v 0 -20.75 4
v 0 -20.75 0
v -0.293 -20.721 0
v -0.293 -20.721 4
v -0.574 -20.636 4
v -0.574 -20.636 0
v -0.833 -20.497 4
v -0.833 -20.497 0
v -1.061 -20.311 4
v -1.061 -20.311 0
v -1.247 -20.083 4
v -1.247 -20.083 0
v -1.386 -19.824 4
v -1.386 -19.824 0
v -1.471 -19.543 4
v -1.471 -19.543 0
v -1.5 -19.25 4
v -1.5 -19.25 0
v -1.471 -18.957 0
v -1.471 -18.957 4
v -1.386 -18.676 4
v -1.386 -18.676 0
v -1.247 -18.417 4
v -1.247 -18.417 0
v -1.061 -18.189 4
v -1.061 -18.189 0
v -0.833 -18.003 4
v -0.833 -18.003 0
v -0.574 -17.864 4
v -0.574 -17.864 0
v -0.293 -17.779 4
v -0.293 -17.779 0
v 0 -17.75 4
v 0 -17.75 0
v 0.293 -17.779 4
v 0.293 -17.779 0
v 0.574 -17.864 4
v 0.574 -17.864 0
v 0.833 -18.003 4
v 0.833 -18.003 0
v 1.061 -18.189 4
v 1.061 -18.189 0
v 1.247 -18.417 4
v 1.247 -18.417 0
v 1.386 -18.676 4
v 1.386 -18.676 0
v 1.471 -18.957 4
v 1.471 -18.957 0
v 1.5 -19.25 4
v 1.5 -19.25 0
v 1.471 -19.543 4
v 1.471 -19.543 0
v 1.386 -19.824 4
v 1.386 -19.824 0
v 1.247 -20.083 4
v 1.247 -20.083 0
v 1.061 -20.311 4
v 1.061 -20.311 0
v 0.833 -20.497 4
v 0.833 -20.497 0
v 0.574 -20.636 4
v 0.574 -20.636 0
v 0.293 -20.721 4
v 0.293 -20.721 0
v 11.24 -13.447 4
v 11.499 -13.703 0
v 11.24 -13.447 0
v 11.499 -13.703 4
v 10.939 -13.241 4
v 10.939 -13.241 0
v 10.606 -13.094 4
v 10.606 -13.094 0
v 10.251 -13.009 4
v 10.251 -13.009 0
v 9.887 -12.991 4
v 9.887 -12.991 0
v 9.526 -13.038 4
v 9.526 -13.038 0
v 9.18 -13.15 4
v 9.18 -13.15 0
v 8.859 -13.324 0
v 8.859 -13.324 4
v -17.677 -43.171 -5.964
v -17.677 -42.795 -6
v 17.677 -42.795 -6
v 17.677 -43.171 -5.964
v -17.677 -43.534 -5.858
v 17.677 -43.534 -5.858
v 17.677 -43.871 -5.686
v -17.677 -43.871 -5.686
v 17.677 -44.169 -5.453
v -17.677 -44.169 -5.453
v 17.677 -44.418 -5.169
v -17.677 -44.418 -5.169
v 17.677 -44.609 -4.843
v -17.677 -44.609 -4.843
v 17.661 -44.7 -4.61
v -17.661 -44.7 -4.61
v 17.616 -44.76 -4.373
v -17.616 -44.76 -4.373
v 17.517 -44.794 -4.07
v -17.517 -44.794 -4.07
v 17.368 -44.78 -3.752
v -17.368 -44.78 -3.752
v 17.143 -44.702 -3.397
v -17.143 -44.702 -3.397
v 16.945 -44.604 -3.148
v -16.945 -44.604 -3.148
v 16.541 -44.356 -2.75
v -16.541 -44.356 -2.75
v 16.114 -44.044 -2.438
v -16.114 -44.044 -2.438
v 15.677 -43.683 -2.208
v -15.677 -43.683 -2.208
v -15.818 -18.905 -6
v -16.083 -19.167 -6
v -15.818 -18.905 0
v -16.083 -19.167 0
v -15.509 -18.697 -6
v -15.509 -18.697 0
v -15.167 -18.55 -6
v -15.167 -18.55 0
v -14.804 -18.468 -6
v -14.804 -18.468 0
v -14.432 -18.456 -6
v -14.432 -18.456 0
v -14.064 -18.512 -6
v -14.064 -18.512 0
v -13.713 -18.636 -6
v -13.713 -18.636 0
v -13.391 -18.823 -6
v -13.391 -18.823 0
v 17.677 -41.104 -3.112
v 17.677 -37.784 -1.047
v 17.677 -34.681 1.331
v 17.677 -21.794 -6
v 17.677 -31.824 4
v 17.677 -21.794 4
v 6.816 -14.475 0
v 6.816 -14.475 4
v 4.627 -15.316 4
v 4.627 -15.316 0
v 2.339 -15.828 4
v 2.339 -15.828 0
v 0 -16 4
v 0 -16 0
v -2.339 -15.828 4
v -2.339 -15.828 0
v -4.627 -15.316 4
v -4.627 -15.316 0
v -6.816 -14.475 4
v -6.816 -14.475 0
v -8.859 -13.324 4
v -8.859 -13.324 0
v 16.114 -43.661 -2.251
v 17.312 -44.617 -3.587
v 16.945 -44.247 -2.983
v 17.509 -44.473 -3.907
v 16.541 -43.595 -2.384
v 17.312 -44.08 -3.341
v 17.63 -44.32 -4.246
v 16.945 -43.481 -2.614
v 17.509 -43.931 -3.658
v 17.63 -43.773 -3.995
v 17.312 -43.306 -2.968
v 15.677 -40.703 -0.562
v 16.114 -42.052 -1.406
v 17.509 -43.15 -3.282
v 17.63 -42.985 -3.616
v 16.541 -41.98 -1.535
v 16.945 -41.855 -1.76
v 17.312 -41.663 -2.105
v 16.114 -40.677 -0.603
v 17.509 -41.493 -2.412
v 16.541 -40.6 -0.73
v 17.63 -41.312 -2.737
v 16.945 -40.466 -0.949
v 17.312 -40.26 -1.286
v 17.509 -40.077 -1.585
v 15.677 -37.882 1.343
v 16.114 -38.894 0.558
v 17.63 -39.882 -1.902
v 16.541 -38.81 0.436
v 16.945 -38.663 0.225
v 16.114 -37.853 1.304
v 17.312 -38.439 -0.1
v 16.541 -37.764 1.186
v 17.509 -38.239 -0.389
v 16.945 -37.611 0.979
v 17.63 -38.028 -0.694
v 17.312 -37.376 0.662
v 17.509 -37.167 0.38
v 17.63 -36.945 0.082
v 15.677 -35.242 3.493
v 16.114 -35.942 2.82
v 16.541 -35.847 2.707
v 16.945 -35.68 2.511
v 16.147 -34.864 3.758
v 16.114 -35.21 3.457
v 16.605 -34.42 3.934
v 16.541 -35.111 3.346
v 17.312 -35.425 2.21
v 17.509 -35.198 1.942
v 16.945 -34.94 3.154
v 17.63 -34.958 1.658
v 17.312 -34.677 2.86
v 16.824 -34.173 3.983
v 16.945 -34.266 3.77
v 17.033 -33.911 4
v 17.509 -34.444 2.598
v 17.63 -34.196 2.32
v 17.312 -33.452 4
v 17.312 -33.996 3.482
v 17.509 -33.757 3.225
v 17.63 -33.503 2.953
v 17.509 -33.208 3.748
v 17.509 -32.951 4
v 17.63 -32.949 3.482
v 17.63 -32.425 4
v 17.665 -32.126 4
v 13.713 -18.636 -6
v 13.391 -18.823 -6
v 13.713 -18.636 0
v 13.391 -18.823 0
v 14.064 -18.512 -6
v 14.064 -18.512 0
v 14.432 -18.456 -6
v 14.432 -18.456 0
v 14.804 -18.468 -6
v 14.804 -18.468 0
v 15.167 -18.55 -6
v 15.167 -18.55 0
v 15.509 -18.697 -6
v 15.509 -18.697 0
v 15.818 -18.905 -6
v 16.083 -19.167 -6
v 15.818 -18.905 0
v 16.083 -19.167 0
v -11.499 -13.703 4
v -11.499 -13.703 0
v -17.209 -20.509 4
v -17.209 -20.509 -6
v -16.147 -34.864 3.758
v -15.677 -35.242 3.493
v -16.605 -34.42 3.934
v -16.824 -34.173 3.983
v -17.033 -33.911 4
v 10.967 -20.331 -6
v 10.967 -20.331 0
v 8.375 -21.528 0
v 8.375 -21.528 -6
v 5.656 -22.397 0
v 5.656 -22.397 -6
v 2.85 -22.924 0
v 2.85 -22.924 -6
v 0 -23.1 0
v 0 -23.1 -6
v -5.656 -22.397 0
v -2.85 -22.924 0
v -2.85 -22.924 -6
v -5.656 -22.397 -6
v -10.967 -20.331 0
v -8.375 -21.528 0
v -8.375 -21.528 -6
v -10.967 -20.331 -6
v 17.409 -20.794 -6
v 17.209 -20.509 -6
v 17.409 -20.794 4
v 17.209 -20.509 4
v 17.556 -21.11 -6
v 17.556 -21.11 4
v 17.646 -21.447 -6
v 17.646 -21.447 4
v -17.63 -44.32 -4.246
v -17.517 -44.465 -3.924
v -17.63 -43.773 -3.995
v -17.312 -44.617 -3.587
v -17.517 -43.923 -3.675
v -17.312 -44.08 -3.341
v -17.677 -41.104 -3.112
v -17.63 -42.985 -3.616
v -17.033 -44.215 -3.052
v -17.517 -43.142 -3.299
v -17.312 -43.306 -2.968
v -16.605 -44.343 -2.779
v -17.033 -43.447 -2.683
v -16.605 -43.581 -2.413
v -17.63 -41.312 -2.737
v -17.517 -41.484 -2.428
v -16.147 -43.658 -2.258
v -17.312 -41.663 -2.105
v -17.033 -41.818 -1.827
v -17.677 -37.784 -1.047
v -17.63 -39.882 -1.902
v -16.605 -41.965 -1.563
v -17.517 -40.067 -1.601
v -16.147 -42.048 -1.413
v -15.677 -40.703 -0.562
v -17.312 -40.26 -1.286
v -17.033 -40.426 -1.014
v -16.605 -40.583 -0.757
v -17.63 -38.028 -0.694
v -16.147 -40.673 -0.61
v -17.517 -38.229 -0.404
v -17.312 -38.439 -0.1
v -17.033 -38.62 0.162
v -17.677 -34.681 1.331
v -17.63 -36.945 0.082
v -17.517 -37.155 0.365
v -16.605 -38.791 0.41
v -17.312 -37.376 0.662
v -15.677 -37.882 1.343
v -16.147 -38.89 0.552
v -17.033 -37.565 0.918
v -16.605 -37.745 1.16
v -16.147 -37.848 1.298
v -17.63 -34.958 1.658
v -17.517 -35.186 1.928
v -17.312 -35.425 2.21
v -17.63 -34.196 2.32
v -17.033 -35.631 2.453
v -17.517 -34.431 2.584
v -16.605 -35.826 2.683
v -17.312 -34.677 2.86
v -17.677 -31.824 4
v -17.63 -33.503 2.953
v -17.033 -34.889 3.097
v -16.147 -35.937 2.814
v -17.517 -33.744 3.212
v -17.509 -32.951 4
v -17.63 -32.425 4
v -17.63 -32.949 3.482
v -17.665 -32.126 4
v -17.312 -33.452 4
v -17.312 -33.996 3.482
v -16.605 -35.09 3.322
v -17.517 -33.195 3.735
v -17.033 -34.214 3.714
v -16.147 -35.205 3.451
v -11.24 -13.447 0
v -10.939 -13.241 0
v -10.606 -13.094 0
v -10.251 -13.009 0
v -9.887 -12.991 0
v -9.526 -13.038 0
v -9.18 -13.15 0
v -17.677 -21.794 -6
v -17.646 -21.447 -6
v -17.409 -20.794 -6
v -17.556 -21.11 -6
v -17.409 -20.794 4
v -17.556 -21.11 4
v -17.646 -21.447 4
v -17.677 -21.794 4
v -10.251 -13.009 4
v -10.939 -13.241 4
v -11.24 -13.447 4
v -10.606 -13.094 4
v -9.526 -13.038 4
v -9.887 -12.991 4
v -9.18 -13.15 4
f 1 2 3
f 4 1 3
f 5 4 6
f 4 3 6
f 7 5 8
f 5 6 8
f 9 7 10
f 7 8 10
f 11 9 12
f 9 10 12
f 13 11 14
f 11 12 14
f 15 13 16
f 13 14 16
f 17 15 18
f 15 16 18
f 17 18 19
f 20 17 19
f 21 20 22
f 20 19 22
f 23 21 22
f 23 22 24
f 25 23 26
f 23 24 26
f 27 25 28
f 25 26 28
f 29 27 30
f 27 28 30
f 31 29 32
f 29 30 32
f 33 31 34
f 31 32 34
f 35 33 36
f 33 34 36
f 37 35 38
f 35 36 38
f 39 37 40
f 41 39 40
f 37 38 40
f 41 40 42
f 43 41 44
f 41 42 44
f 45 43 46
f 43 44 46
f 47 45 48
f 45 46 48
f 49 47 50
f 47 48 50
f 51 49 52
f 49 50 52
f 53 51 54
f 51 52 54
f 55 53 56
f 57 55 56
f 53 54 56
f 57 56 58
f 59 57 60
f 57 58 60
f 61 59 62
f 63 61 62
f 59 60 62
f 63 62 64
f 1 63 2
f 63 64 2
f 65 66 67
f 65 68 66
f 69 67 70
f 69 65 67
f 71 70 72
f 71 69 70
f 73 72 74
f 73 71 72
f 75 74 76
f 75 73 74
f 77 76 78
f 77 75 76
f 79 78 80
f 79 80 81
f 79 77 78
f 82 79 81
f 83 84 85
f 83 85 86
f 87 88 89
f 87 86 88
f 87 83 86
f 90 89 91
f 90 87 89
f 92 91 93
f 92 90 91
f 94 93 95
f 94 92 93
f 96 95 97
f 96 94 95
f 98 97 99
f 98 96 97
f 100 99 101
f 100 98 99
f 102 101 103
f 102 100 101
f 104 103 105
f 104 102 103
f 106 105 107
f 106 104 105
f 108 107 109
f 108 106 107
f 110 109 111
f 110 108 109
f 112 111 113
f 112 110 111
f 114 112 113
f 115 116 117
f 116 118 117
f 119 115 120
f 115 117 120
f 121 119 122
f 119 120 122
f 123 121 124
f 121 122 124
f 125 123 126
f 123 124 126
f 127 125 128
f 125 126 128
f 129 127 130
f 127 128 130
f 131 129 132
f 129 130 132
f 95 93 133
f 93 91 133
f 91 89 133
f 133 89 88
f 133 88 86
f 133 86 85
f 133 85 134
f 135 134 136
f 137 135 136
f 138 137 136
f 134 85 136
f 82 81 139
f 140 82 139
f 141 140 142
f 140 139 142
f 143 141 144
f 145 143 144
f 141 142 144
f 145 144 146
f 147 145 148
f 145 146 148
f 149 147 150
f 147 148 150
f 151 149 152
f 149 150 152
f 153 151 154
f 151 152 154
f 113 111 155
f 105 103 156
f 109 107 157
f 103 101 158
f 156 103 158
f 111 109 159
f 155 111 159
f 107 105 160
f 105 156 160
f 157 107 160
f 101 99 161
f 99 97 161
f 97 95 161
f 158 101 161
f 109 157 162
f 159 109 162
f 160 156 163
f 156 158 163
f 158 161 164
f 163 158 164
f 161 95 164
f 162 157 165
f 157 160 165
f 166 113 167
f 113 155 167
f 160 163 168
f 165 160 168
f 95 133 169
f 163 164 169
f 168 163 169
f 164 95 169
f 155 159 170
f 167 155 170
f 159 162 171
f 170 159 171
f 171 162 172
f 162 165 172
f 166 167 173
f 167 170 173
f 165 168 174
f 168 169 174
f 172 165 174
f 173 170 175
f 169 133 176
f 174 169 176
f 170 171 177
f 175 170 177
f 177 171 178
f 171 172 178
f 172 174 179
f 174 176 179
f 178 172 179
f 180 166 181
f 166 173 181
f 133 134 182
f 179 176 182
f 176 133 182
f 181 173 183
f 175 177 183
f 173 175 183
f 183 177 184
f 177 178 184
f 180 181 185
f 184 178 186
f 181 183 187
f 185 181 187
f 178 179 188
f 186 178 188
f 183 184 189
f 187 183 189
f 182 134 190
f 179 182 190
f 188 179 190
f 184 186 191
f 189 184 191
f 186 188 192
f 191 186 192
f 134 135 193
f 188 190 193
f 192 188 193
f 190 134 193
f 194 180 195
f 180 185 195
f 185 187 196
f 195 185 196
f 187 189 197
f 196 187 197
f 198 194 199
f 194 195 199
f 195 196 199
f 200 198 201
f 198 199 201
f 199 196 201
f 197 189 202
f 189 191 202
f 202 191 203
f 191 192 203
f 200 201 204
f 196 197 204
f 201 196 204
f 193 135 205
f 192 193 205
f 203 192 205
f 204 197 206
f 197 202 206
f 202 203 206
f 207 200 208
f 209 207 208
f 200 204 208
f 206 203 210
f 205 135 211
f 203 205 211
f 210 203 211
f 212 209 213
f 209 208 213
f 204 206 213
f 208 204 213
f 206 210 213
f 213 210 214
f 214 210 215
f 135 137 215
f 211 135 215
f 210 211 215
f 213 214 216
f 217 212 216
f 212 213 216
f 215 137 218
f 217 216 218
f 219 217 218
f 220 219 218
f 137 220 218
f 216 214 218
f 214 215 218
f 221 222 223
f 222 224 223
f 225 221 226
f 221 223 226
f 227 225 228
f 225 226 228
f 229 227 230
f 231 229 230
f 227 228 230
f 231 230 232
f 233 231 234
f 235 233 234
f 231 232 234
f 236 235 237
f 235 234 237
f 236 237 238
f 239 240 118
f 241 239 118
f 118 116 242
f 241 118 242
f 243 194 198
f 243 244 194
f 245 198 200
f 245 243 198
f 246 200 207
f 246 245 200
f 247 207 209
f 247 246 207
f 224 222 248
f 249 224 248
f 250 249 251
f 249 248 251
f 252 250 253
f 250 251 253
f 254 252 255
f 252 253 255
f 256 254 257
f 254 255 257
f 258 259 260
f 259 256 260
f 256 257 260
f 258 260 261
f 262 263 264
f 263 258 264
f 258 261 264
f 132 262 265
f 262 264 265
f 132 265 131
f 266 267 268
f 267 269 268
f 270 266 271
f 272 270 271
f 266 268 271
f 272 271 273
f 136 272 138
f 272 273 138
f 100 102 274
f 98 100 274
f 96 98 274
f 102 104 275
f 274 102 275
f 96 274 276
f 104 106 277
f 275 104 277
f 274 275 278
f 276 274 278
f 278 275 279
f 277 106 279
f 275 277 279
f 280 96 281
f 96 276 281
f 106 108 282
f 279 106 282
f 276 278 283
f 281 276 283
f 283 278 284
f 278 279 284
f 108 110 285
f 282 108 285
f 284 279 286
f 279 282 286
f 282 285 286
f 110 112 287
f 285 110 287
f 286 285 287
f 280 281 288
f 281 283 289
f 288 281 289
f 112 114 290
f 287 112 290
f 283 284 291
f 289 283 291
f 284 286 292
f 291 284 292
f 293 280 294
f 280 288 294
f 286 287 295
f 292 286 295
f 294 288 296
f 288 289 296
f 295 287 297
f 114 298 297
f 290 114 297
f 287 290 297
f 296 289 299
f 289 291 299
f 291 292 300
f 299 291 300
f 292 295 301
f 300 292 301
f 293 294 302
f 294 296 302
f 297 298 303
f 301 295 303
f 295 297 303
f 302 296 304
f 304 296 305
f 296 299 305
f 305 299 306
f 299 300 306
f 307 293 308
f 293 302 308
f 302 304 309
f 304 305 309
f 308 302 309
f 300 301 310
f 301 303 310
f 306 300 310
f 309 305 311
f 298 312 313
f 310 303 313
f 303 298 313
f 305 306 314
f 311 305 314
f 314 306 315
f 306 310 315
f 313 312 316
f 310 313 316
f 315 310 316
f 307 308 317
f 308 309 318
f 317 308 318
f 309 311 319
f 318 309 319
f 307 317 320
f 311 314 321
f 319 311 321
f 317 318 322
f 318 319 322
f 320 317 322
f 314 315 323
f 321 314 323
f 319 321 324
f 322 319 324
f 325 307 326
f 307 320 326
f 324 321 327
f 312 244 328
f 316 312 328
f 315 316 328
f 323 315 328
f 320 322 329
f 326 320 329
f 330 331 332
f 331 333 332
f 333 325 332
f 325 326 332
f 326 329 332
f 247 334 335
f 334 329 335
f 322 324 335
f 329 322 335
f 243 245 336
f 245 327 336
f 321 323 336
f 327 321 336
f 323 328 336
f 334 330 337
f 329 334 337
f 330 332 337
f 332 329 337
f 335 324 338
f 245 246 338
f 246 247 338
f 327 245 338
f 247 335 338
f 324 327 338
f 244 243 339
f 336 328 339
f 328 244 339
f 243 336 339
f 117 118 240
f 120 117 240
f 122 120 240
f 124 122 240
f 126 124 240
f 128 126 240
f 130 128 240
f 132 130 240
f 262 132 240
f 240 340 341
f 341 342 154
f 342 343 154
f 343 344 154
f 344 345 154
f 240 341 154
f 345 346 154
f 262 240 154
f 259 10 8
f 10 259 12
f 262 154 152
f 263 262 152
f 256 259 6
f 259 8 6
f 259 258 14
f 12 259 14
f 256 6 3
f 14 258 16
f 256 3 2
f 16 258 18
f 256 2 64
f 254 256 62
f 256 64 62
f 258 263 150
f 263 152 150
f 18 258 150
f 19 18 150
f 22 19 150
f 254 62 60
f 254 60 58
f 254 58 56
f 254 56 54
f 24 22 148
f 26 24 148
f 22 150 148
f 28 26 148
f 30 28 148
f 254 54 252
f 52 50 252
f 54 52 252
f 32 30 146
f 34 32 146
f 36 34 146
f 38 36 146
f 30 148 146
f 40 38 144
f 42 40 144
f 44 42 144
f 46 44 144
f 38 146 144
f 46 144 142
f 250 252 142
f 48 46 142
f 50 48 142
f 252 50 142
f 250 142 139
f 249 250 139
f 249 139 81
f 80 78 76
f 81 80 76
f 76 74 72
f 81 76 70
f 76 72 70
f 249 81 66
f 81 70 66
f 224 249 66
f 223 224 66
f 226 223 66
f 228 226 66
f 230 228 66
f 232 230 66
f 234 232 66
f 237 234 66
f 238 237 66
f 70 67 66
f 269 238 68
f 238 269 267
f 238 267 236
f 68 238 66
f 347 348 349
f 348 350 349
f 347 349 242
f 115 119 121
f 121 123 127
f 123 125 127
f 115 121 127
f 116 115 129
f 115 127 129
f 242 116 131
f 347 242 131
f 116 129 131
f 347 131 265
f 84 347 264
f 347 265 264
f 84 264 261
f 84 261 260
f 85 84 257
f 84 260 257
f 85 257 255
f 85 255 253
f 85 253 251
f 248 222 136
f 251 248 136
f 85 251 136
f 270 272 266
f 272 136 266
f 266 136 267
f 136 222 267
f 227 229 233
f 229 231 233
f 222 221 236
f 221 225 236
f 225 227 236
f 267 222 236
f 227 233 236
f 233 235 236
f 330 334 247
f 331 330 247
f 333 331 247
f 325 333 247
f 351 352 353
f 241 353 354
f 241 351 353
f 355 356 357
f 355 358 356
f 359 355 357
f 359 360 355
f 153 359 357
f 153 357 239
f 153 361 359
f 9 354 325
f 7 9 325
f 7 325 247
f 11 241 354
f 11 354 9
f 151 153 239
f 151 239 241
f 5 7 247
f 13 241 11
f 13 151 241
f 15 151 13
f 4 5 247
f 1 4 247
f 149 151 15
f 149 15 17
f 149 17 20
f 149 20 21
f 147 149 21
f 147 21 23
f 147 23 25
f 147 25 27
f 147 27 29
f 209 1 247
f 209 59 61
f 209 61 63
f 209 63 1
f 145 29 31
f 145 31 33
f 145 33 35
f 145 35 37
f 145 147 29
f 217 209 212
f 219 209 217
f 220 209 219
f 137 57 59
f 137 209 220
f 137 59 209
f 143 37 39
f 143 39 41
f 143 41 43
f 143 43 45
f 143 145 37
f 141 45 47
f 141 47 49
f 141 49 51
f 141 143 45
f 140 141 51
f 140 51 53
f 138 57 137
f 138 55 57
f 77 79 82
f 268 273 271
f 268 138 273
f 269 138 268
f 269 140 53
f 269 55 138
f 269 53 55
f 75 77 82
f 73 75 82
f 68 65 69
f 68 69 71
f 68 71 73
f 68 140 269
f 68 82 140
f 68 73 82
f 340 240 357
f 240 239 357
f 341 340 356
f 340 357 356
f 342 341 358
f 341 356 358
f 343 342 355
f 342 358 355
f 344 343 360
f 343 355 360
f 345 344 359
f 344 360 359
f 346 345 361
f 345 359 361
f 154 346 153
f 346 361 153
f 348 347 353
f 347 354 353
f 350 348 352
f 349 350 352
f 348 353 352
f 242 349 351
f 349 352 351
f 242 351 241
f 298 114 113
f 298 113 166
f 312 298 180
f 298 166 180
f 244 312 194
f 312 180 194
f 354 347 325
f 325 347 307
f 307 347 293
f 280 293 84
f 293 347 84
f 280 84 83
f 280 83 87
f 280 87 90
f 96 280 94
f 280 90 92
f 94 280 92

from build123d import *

# Parameters (mm, degrees)
EXTRUDE_1_DEPTH     = 4
EXTRUDE_START       = -10
EXTRUDE_2_DEPTH     = 10
EXTRUDE_3_DEPTH     = 10
CUT_EXTRUDE_1_DEPTH = 80.60065996608486
FILLET_1_R          = 2


with BuildPart() as part:
    # 草图1 → 凸台-拉伸1 (new body)
    with BuildSketch(Plane.XY):
        with BuildLine():
            ThreePointArc((10.284601754984639, -12.256711089903641), (5.472322293210865, -15.035081932574474), (3.3812e-13, -16))
            Line((0, -16), (0, -17.75))
            ThreePointArc((-1.91e-15, -17.75), (1.0606601717798214, -18.189339828220177), (1.5000000000000009, -19.25))
            ThreePointArc((1.5000000000000009, -19.25), (1.0606601717798207, -20.310660171779823), (-2.94e-15, -20.75))
            Line((0, -20.75), (0, -23.100000000000005))
            ThreePointArc((-4.24e-15, -23.100000000000005), (7.900665310822955, -21.706899540154488), (14.848393783759075, -17.695626636048384))
            Line((14.848393783759088, -17.695626636048377), (10.28460175498465, -12.256711089903638))
        make_face()
        with BuildLine():
            Line((0, -17.75), (0, -16))
            ThreePointArc((3.3812e-13, -16), (-5.472322293210549, -15.035081932574588), (-10.284601754984644, -12.256711089903638))
            Line((-10.284601754984646, -12.25671108990364), (-14.848393783759084, -17.69562663604838))
            ThreePointArc((-14.848393783759082, -17.69562663604838), (-7.900665310822965, -21.706899540154485), (-4.24e-15, -23.100000000000005))
            Line((0, -23.100000000000005), (0, -20.75))
            ThreePointArc((-2.94e-15, -20.75), (-1.5000000000000009, -19.25), (-2.24e-15, -17.75))
        make_face()
    extrude(amount=EXTRUDE_1_DEPTH)

    # 草图3 → 凸台-拉伸2 (add)
    with BuildSketch(Plane.XY.offset(4).offset(EXTRUDE_START)):
        with BuildLine():
            ThreePointArc((14.848393783759091, -17.695626636048377), (3.55e-15, -23.100000000000012), (-14.848393783759086, -17.69562663604838))
            Line((-14.848393783759084, -17.69562663604838), (-17.676659266379858, -21.066222185771874))
            ThreePointArc((-17.676659266379858, -21.066222185771878), (-5.05e-15, -27.5), (17.676659266379847, -21.066222185771885))
            Line((17.67665926637986, -21.066222185771874), (14.84839378375909, -17.695626636048377))
        make_face()
    extrude(amount=EXTRUDE_2_DEPTH)

    # 草图4 → 凸台-拉伸3 (add)
    with BuildSketch(Plane.XY.offset(4).offset(EXTRUDE_START)):
        with BuildLine():
            Line((-17.67665926637985, -71.06622218577188), (17.67665926637986, -71.06622218577188))
            Line((17.67665926637986, -71.06622218577188), (17.67665926637986, -21.066222185771874))
            ThreePointArc((17.67665926637986, -21.066222185771874), (1.68e-15, -27.5), (-17.676659266379858, -21.066222185771878))
            Line((-17.676659266379858, -21.066222185771878), (-17.67665926637985, -71.06622218577188))
        make_face()
    extrude(amount=EXTRUDE_3_DEPTH)

    # 草图7 → 切除-拉伸1 (cut, through all)
    with BuildSketch(Plane(origin=(17.67665926637986, 0, 0), x_dir=(0, 0, -1), z_dir=(1, 0, 0))):
        with BuildLine():
            ThreePointArc((6, -57.06223919512314), (2.8499690271271234, -45.04655535209204), (-3.9999999999999893, -34.68425456157568))
            Line((-4, -34.68425456157568), (-4, -71.06622218577188))
            Line((-4, -71.06622218577188), (6, -71.06622218577188))
            Line((6, -71.06622218577188), (6, -57.06223919512314))
        make_face()
    extrude(amount=-CUT_EXTRUDE_1_DEPTH, mode=Mode.SUBTRACT)

    # 圆角1
    fillet_1_edges = [part.edges().sort_by_distance(p)[0] for p in [
        (10.284601754984646, -12.25671108990364, 2),
        (-10.284601754984646, -12.256711089903636, 2),
        (-14.848393783759086, -17.69562663604838, -3),
        (-17.676659266379858, -21.066222185771878, -1),
        (14.848393783759091, -17.69562663604838, -3),
        (17.676659266379858, -21.066222185771885, -1),
        (17.67665926637986, -45.04655535209205, -2.8499690271271234),
        (3.55e-15, -34.68425456157568, 3.999999999999993),
        (3.55e-15, -57.06223919512314, -6),
        (-17.676659266379854, -45.04655535209205, -2.8499690271271234),
    ]]
    fillet(fillet_1_edges, radius=FILLET_1_R)


solid = part.part
